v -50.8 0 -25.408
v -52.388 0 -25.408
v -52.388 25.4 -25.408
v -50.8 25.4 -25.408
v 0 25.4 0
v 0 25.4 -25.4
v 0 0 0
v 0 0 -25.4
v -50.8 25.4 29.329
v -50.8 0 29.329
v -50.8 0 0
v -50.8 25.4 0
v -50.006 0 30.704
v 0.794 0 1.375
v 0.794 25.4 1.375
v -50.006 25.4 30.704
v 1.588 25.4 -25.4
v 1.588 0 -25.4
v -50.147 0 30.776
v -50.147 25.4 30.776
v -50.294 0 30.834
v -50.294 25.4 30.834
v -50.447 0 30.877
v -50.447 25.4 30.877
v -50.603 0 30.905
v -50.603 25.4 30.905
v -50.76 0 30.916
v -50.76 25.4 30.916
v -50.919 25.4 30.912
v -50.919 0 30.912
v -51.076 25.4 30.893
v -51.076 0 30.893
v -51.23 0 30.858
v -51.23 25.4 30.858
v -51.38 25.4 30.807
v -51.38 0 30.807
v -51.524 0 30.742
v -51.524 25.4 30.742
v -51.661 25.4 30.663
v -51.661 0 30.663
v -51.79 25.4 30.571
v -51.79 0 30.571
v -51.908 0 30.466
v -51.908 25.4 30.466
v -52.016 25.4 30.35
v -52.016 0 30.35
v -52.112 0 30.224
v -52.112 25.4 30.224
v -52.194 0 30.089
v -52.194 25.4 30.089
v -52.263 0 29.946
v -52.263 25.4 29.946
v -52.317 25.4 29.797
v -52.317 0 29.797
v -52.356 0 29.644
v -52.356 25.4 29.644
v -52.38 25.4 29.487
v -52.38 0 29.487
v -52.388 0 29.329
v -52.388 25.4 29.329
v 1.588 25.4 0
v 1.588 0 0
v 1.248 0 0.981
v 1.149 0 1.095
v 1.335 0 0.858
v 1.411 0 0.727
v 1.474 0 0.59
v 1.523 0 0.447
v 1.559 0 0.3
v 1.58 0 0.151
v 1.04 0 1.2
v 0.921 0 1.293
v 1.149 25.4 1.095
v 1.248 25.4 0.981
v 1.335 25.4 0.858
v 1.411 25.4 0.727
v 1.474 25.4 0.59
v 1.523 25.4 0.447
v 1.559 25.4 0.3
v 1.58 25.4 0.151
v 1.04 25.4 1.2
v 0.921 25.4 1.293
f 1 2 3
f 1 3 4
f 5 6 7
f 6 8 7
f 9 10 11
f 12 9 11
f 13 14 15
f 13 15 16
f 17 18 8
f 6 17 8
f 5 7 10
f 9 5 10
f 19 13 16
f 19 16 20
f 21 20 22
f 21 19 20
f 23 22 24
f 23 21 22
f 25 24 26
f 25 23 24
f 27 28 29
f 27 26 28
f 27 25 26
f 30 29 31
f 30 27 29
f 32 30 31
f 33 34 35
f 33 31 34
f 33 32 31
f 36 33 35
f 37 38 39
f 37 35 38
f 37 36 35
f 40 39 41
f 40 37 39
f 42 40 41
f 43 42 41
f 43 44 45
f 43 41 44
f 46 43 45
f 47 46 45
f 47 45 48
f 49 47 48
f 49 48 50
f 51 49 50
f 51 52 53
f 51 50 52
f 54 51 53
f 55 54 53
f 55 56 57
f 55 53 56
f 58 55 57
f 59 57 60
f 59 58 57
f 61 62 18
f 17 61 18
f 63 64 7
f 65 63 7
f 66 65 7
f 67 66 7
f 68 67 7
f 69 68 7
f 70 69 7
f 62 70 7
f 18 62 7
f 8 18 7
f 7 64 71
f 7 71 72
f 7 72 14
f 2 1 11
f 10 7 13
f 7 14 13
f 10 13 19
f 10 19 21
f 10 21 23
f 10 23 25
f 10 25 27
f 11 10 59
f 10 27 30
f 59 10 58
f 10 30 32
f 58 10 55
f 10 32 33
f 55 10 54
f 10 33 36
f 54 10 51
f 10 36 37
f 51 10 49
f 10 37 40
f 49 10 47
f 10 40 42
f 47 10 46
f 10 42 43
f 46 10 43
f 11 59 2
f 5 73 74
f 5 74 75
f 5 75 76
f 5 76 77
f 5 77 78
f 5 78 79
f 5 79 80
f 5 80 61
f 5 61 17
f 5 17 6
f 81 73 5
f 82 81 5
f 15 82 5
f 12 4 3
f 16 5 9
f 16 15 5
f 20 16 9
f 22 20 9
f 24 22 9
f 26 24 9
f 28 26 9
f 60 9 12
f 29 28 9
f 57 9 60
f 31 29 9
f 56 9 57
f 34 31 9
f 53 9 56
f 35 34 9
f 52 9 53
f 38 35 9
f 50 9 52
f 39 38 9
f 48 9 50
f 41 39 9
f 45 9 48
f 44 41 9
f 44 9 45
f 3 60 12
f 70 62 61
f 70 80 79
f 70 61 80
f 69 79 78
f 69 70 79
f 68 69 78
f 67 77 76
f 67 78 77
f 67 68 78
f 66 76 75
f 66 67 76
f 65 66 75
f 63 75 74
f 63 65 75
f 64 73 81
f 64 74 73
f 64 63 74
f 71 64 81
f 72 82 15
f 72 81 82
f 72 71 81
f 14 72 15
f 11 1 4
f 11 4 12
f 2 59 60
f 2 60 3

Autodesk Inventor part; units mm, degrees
ref_plane "YZ Plane" through (0, 0, 0) normal (1, 0, 0) x (0, 1, 0)
ref_plane "XZ Plane" through (0, 0, 0) normal (0, 1, 0) x (-1, 0, 0)
ref_plane "XY Plane" through (0, 0, 0) normal (0, 0, 1) x (1, 0, 0)
sketch "Sketch1" plane through (0, 0, 0) normal (0, 1, 0) x (-1, 0, 0)
  line L0 (-1.5875, 0) -> (-1.5875, -25.4)
  line L1 (-1.5875, -25.4) -> (0, -25.4)
  line L2 (0, -25.4) -> (0, 0)
  line L3 (0, 0) -> (50.8, 29.3294)
  line L4 (50.8, 29.3294) -> (50.8, 0)
  line L5 (52.3875, 29.3294) -> (52.3875, -25.4076)
  line L6 (52.3875, -25.4076) -> (50.8, -25.4076)
  line L7 (50.8, -25.4076) -> (50.8, 29.3294)
  line L8 (-0.7937, 1.3748) -> (50.0062, 30.7042)
  arc A0 (52.3875, 29.3294) -> (50.0062, 30.7042) centre (50.8, 29.3294) ccw
  arc A1 (-0.7937, 1.3748) -> (-1.5875, 0) centre (0, 0) ccw
  dimension "d0" = 1.5875
  dimension "d1" = 25.4
  dimension "d5" = 1.5875
  dimension "d6" = 54.737
  dimension "d7" = 1.5875
  dimension "d8" = 1.5875
extrude "Extrusion1" add sketch "Sketch1" along normal blind 25.4
